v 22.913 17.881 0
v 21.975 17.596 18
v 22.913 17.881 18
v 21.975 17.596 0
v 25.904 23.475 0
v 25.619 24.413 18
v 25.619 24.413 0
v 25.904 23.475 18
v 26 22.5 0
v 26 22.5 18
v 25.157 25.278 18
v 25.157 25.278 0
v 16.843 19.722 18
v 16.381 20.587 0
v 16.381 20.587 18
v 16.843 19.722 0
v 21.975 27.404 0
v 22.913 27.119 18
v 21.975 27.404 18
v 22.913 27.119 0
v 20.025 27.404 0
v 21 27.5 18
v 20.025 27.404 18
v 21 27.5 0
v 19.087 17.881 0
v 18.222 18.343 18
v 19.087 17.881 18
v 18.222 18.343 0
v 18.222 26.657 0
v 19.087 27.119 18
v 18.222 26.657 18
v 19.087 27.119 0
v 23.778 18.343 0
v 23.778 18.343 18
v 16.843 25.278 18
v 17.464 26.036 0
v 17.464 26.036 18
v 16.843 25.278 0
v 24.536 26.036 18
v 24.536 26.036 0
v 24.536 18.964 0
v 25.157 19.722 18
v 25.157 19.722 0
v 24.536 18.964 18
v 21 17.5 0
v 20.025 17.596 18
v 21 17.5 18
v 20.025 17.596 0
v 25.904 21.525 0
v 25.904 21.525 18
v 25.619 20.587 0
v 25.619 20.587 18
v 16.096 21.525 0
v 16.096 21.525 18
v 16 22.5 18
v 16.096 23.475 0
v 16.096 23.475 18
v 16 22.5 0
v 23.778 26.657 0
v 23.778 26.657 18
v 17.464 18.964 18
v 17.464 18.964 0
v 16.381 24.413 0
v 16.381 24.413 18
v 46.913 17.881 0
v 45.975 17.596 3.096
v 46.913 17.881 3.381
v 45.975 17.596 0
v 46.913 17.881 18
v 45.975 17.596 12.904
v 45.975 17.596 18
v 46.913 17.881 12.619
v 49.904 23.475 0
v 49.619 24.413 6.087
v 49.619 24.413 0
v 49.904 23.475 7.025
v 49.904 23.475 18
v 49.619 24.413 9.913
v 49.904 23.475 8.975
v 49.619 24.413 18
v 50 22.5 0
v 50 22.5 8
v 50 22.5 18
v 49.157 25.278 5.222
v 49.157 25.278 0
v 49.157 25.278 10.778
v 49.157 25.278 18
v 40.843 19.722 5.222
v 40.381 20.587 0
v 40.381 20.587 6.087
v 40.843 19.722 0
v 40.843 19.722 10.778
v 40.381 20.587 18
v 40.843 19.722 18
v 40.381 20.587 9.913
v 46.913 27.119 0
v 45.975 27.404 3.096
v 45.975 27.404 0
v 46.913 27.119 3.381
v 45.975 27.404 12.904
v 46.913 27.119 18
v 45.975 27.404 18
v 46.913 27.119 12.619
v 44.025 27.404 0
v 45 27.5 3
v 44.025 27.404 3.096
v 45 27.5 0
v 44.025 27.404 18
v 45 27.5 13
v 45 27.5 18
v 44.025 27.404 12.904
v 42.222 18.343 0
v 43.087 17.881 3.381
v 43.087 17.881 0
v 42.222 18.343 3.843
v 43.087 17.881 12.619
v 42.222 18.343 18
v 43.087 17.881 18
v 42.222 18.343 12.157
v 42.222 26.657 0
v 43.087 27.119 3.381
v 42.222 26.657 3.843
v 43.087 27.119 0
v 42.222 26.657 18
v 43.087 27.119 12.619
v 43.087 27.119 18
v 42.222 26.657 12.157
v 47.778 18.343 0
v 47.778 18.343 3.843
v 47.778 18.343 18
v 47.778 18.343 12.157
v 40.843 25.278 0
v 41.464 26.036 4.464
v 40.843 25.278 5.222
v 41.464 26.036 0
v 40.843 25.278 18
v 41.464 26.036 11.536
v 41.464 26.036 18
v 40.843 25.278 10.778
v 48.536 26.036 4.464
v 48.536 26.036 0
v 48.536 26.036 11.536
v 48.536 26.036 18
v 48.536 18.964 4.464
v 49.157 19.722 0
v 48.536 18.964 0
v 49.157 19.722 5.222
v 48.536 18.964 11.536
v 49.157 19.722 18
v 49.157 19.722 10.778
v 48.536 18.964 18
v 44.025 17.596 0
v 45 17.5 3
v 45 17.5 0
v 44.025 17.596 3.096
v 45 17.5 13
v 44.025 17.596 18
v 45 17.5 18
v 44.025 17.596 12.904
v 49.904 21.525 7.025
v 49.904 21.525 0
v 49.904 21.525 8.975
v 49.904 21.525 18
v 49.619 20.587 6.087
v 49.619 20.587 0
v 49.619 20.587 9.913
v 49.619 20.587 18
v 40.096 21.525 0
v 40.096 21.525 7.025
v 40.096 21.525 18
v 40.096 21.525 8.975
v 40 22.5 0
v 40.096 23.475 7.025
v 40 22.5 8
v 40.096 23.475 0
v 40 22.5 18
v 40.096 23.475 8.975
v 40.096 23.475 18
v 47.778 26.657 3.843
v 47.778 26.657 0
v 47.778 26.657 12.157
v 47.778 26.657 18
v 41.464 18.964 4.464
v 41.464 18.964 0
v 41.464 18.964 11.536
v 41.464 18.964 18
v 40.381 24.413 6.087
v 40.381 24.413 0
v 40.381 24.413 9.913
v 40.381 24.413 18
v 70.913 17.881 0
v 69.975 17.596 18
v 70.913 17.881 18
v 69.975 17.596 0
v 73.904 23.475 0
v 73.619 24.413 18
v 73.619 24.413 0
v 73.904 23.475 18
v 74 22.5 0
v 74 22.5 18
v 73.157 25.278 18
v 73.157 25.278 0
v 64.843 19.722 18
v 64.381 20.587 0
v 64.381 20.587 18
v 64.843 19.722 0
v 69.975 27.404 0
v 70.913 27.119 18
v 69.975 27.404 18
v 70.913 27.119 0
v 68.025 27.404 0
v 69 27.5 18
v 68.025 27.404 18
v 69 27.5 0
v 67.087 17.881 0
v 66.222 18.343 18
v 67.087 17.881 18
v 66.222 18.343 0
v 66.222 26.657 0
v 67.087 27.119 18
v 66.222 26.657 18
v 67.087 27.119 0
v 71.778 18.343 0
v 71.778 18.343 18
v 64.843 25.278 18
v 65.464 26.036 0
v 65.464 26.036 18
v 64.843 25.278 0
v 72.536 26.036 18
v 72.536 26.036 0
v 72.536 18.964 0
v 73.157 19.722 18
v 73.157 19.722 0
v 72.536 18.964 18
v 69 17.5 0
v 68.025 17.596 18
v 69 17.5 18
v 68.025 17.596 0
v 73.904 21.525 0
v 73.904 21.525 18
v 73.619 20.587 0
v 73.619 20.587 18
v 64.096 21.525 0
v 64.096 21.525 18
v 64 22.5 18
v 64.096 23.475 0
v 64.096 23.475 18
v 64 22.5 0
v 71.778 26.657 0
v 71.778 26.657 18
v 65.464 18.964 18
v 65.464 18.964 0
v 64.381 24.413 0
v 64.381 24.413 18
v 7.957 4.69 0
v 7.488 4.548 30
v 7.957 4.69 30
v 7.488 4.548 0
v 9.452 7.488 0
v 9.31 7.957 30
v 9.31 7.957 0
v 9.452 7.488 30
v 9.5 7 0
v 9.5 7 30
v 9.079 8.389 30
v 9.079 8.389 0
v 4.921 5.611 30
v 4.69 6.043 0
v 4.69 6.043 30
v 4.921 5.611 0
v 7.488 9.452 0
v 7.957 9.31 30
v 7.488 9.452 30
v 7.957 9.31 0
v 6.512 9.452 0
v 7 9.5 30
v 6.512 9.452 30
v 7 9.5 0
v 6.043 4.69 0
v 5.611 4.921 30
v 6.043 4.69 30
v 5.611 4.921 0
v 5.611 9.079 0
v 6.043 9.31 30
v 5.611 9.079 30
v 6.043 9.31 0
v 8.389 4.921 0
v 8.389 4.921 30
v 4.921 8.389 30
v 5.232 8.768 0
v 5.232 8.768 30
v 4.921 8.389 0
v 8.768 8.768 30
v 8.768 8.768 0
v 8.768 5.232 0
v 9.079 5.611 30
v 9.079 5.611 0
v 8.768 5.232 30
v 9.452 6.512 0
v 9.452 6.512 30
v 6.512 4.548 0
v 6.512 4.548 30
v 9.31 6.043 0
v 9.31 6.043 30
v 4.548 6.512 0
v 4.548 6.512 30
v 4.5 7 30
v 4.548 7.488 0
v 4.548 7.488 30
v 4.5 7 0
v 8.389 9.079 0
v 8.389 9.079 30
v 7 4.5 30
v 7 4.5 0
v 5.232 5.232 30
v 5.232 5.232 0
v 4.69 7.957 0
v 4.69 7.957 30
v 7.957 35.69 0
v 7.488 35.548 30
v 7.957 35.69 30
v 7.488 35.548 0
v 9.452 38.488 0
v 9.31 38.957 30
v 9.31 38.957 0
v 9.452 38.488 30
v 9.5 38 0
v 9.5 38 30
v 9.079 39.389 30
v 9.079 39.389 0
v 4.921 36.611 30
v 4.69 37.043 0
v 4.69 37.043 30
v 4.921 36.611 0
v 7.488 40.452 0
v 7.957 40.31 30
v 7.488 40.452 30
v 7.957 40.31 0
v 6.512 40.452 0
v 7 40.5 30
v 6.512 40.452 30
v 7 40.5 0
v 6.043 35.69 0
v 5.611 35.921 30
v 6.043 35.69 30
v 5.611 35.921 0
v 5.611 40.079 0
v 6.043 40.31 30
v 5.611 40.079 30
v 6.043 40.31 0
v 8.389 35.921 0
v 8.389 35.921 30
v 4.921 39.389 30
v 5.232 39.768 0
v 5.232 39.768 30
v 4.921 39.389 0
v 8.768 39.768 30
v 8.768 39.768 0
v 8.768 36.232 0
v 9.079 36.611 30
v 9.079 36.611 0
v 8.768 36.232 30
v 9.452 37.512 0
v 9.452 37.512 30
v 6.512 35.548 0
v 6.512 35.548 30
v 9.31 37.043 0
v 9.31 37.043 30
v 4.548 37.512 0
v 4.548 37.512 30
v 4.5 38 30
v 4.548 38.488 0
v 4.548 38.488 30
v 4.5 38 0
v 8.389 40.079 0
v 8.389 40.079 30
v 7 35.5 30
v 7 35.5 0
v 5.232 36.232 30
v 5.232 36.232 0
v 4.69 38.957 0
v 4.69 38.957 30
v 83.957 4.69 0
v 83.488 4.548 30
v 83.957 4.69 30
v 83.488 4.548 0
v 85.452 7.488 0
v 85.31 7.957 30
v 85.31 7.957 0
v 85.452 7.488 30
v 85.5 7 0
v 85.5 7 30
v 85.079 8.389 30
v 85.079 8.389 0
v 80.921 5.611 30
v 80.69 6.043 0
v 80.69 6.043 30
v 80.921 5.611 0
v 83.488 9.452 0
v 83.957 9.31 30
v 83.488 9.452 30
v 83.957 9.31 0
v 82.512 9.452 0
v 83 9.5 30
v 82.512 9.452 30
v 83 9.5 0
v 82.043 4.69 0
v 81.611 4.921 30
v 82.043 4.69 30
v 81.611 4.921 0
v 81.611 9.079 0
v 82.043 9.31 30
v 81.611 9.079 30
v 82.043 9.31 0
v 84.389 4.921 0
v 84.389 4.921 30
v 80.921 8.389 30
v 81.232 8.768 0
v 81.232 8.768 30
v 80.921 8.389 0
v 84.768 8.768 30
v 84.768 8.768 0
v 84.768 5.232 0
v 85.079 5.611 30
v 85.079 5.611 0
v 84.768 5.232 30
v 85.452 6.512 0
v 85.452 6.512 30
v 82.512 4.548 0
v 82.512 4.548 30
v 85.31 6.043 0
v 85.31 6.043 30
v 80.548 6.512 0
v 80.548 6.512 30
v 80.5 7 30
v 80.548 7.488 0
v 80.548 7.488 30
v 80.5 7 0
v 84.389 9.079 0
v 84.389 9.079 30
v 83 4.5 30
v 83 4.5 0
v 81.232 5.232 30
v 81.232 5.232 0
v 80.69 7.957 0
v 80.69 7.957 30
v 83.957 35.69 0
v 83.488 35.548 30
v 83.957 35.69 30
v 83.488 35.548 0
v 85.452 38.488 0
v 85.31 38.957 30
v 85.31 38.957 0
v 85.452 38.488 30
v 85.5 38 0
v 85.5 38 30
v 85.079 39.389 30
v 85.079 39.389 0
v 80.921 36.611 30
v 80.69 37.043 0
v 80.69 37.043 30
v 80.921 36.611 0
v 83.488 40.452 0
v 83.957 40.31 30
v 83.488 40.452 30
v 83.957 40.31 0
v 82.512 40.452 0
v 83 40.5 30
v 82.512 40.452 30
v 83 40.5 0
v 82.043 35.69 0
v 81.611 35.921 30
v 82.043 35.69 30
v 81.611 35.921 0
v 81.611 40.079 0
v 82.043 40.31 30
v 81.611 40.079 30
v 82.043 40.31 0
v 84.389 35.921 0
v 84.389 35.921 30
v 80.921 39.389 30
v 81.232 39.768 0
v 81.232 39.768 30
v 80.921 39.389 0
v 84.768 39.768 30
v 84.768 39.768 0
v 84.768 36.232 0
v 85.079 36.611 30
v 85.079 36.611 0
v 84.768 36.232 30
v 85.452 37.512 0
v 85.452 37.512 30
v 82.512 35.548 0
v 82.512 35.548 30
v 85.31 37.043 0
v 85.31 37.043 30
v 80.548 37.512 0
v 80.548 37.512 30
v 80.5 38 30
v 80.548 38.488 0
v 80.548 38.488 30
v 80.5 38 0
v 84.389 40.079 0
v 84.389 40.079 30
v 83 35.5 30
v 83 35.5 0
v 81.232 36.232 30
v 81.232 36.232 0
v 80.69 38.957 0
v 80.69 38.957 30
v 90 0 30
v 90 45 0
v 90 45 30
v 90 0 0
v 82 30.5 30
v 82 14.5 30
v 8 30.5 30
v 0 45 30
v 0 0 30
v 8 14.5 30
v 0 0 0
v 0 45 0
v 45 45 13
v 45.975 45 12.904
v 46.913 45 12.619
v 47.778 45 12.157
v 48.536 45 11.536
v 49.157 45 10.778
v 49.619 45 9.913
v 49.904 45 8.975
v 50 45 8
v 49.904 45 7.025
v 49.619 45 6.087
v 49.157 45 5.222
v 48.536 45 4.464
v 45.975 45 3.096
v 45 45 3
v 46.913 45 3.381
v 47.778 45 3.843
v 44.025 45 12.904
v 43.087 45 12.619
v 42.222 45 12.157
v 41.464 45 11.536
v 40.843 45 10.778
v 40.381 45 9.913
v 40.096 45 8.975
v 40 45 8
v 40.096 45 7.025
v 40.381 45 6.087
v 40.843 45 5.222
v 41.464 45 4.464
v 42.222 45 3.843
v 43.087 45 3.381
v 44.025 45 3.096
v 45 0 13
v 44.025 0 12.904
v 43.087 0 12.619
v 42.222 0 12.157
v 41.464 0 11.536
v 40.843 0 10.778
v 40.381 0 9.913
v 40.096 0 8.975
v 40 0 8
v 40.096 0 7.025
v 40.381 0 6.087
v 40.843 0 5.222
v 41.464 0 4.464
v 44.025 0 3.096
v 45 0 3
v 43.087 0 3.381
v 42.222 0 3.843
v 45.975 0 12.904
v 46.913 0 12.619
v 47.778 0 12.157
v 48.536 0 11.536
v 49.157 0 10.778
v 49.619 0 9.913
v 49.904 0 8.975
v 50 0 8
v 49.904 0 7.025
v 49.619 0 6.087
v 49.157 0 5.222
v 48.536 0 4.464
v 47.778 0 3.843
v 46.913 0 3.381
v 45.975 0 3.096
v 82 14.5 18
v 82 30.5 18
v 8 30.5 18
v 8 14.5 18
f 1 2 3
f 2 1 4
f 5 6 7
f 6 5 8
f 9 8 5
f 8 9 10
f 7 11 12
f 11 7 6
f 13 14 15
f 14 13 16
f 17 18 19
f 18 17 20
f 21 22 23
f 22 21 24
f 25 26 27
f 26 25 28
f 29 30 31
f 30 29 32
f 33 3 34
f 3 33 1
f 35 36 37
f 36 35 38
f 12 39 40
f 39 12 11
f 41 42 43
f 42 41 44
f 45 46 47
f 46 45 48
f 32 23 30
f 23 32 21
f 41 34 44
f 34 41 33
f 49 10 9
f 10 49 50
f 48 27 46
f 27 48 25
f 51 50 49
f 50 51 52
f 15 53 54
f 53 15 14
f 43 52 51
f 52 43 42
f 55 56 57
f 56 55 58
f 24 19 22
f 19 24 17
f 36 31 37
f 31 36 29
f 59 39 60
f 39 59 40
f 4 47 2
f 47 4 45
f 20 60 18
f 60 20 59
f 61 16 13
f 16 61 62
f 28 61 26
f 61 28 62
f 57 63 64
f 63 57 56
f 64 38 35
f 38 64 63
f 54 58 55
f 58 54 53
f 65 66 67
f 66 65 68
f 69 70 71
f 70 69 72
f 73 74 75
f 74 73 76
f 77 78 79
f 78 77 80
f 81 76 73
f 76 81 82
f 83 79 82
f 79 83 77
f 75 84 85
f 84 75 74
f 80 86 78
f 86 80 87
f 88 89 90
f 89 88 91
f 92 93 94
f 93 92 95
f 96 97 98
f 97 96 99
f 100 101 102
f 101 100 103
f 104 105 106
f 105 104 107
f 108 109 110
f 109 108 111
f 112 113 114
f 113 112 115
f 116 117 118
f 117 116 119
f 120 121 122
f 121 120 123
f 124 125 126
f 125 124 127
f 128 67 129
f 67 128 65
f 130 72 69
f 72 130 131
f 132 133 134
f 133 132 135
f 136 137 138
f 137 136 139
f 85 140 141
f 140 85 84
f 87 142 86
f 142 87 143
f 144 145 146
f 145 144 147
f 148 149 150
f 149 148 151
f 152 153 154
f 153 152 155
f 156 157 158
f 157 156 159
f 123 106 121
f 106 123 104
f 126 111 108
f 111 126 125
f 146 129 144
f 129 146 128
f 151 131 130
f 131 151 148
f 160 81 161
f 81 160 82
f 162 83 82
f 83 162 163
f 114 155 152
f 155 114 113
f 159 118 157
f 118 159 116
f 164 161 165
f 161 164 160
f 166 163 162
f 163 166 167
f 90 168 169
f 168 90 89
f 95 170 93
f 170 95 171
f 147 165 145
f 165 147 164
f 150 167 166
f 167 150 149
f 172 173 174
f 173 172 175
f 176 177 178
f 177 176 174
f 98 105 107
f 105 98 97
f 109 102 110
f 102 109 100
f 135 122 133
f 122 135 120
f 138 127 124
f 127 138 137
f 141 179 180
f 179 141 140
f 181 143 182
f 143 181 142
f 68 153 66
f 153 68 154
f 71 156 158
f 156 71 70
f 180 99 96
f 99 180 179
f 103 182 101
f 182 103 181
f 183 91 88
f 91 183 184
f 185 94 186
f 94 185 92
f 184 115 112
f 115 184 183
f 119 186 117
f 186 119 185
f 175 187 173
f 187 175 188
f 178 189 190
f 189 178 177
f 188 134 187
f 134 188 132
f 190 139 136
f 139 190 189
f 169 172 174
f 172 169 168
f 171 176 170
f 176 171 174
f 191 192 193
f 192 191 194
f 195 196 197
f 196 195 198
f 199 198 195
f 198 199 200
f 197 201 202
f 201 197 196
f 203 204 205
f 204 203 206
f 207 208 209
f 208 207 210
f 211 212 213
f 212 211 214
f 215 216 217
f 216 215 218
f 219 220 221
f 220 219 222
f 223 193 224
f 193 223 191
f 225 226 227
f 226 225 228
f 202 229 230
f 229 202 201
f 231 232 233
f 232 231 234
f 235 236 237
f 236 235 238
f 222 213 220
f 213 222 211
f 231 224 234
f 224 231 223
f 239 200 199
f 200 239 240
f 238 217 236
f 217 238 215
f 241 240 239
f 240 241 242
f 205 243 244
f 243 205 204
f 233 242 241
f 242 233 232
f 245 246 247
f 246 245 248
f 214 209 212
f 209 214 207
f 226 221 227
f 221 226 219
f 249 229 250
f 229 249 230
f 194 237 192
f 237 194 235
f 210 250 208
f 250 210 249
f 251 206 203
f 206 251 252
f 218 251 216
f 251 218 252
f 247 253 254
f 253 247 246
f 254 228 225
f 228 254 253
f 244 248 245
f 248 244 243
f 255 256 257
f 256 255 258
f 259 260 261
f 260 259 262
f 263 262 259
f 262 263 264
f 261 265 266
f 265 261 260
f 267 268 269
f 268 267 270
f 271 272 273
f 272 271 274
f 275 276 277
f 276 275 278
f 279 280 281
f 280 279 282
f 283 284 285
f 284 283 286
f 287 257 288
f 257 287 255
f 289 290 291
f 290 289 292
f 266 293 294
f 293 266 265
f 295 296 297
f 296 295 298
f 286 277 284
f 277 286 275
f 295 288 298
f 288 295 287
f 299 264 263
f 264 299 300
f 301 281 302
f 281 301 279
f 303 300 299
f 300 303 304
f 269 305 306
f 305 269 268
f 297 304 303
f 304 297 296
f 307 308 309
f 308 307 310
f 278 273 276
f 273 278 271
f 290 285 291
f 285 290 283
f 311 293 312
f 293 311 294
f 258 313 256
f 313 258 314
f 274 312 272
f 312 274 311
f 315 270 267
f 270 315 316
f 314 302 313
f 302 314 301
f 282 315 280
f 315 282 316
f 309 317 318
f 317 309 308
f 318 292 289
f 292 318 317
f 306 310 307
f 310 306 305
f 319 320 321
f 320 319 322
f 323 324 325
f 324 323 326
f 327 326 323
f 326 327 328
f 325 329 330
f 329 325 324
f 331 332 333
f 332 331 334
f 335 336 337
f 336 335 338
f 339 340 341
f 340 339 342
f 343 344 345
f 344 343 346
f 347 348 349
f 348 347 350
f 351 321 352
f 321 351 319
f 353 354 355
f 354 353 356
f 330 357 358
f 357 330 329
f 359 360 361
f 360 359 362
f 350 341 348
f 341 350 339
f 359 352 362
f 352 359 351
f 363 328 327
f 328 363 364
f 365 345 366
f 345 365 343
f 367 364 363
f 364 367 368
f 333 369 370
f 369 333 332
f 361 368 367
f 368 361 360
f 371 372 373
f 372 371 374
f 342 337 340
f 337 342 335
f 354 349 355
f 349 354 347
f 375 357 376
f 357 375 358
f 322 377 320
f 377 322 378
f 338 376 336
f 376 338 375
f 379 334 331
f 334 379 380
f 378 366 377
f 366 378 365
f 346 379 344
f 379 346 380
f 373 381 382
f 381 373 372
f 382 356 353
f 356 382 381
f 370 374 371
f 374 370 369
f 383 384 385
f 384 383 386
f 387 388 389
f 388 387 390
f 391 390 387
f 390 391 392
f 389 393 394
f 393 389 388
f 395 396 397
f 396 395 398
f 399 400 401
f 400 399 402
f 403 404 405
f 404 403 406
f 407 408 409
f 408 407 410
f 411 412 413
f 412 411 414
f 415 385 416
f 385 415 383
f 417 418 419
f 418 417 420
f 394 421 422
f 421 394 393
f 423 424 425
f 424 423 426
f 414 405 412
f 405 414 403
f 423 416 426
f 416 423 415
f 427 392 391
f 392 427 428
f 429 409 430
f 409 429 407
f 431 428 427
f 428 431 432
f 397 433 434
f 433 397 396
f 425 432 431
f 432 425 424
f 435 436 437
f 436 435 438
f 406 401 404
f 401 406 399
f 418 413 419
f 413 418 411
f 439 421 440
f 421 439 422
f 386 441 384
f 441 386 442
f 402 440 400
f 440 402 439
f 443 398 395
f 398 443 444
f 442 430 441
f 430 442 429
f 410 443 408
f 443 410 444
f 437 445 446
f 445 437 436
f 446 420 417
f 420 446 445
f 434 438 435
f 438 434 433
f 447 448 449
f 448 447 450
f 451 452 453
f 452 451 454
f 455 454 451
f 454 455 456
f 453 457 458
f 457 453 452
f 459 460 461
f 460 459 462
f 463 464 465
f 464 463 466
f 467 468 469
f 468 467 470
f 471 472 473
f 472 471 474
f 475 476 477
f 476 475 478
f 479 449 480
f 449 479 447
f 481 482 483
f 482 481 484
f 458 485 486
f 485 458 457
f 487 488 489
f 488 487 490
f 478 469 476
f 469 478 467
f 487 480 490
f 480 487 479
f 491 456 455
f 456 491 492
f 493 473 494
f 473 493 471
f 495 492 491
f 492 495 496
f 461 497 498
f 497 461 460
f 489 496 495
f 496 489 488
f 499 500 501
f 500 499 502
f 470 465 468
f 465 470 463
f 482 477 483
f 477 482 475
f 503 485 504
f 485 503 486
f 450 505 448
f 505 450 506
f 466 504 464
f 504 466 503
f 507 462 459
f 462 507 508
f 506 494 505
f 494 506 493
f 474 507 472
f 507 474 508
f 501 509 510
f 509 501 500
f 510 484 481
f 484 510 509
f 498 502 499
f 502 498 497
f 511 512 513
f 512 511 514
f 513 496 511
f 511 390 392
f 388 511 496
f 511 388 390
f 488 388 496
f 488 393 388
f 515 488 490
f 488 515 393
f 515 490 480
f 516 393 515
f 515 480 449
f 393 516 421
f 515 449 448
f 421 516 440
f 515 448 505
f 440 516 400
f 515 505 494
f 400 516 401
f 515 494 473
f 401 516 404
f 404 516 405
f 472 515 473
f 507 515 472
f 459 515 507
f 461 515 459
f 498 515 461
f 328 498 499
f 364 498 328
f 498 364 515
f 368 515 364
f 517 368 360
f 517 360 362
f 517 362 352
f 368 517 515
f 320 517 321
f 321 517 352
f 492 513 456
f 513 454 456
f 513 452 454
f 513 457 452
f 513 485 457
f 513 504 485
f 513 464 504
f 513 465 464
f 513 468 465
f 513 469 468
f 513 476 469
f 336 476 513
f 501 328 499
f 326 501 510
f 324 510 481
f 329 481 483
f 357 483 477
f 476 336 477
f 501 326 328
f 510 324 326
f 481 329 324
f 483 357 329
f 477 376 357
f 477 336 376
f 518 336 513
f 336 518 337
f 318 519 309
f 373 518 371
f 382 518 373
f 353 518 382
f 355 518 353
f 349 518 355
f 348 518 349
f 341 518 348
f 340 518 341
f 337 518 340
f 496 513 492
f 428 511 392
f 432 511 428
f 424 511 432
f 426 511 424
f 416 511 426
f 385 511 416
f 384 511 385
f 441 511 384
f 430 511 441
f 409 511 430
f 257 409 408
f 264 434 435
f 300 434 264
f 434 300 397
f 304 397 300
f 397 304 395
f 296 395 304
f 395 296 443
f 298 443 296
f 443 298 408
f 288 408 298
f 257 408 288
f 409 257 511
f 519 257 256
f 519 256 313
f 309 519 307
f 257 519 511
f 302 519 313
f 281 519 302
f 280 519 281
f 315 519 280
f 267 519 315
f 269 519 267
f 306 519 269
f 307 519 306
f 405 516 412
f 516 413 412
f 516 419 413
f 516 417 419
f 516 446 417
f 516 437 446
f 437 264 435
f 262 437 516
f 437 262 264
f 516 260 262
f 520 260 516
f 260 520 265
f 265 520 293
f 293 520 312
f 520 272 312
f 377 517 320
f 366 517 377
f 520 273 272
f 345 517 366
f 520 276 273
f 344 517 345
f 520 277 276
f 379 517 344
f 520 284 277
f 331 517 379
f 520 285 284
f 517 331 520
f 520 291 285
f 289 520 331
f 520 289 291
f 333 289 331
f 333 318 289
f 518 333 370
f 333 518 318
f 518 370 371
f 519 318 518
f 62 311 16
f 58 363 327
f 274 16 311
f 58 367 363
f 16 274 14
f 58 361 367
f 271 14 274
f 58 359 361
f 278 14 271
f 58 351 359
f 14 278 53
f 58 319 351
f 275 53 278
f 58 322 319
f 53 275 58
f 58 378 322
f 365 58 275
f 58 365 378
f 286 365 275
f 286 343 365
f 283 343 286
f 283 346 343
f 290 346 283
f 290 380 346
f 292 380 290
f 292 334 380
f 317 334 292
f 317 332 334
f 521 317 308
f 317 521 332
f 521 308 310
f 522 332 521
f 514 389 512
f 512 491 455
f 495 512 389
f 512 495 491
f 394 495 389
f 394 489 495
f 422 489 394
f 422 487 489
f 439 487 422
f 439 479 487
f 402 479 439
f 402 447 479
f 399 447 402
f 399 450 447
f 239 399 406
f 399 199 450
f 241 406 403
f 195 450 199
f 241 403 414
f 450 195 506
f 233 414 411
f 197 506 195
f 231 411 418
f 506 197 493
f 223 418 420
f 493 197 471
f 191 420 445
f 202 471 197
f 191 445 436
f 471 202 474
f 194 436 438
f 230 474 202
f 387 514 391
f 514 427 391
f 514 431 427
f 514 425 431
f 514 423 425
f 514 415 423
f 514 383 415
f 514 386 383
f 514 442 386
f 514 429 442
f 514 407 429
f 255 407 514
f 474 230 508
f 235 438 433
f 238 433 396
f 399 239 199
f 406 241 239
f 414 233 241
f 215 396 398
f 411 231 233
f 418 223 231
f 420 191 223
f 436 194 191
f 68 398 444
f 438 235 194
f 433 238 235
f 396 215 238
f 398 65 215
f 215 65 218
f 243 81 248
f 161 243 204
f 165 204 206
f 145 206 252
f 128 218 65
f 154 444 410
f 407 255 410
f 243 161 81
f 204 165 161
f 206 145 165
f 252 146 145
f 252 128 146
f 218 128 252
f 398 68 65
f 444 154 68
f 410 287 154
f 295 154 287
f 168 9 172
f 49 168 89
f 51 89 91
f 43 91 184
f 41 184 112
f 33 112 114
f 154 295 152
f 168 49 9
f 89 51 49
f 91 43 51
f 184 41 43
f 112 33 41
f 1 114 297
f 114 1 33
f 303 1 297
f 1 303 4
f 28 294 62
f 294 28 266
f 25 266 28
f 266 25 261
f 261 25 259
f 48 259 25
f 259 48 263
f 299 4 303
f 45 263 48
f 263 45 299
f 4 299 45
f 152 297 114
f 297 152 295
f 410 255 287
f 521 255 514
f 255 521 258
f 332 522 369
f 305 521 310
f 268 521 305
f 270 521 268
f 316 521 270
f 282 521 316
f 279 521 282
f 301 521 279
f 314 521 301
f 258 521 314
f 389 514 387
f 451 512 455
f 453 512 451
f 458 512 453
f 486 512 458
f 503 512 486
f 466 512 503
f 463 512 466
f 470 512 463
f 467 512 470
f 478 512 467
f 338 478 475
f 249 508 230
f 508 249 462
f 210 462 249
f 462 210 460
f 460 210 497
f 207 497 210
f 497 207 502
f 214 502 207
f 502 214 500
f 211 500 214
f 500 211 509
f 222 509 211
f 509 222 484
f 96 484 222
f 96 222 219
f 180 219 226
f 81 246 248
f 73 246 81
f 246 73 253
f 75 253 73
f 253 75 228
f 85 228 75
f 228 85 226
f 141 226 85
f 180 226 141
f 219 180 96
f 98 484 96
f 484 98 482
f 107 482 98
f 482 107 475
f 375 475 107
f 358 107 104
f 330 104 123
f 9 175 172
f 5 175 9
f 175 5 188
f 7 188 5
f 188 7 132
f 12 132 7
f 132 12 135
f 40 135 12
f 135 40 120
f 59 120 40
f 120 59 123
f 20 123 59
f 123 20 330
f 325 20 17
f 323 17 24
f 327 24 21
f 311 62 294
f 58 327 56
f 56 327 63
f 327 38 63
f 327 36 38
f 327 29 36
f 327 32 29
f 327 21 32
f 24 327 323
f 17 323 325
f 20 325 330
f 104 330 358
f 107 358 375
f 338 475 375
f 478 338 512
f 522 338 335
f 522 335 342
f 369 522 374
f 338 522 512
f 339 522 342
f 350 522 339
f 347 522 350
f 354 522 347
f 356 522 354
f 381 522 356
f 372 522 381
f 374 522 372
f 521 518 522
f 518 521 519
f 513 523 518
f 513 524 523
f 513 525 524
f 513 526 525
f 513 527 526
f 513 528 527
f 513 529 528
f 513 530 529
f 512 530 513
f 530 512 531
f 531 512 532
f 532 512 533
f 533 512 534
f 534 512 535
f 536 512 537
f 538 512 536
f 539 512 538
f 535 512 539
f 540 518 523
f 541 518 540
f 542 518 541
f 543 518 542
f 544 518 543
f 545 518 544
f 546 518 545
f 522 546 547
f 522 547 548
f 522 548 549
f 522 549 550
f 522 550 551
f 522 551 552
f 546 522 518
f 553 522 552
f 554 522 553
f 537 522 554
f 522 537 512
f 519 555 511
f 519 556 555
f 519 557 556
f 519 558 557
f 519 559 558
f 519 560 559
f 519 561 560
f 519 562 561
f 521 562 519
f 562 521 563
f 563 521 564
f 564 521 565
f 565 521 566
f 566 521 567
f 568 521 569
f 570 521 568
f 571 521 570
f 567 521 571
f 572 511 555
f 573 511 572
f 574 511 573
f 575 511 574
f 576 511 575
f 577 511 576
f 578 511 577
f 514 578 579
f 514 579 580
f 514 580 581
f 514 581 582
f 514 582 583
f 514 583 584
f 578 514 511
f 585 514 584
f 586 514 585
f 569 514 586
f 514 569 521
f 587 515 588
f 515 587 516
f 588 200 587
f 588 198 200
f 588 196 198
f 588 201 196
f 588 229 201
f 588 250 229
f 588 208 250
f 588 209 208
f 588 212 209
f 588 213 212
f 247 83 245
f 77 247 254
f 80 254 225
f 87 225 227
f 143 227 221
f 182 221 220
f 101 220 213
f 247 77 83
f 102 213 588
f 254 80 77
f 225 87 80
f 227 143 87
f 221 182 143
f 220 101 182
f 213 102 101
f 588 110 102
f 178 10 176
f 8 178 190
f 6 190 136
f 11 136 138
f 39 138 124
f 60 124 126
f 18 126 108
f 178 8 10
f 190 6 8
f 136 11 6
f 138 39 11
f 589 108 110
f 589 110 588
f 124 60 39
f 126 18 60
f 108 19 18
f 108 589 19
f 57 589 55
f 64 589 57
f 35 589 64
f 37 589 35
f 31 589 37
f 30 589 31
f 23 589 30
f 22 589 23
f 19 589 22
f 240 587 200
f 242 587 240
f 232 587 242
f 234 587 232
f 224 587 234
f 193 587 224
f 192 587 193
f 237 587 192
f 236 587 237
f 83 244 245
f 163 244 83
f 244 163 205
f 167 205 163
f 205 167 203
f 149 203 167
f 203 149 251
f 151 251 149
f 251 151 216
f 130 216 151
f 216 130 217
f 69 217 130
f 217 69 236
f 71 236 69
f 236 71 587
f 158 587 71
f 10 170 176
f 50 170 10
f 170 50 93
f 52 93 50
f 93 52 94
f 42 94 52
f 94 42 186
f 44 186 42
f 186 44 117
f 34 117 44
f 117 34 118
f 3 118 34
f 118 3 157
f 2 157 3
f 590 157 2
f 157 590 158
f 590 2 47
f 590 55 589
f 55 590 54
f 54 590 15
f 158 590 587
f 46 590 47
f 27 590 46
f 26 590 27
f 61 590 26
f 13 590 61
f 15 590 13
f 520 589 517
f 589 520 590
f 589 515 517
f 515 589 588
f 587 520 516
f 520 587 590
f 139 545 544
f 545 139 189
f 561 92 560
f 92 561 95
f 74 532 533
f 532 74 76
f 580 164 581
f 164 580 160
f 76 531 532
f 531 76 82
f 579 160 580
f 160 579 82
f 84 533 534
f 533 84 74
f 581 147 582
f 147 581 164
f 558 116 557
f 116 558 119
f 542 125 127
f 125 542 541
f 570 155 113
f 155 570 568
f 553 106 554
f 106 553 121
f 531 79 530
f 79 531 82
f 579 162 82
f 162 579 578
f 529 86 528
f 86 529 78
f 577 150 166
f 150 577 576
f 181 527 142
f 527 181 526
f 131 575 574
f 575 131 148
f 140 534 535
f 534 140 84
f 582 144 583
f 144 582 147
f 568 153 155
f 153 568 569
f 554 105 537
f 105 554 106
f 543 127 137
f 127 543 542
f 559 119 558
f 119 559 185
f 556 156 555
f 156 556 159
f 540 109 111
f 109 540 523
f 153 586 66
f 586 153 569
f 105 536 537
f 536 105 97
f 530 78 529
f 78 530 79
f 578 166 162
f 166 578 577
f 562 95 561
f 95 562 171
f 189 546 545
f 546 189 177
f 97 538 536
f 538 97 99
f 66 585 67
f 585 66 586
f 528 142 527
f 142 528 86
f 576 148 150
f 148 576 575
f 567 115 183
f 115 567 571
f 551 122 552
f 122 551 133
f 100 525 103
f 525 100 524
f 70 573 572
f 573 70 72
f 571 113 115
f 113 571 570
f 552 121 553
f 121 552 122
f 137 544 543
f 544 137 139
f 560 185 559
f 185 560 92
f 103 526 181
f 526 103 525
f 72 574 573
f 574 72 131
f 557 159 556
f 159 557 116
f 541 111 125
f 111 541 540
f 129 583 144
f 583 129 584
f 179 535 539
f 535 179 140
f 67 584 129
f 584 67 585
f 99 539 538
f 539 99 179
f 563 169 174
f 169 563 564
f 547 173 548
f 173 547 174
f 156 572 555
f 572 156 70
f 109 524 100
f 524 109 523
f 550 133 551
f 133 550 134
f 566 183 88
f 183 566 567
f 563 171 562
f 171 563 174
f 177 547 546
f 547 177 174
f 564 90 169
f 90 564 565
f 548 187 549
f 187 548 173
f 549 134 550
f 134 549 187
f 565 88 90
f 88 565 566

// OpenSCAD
$fn = 32;

// ----------------------------------------------------------------------
// Manifold block: side_outlet manifold
// ----------------------------------------------------------------------

// --- parameters (mm) ---
block_l = 90;             // block length, X
block_w = 45;             // block width, Y
block_h = 30;             // block height, Z
port_d = 10;              // port bore diameter
port_pitch = 24;          // port pitch along X
gallery_d = 16;           // top gallery width, Y
gallery_depth = 12;       // gallery pocket depth
wall_p = 8;               // gallery end wall thickness, X
mnt_d = 5;                // mounting hole diameter
mnt_in = 7;               // mounting hole inset from the edges
out_d = 10;               // outlet bore diameter
out_z = 8;                // outlet axis height

n_ports = 3;  // ports in the row
port_x0 = (block_l - (n_ports - 1) * port_pitch) / 2;  // first port X

difference() {
  cube([block_l, block_w, block_h]);
  for (i = [0 : n_ports - 1])
    translate([port_x0 + i * port_pitch, block_w / 2, -1])
      cylinder(h = block_h + 2, d = port_d);
  translate([wall_p, block_w / 2 - gallery_d / 2, block_h - gallery_depth])
    cube([block_l - 2 * wall_p, gallery_d, gallery_depth + 1]);
  for (cx = [mnt_in, block_l - mnt_in])
    for (cy = [mnt_in, block_w - mnt_in])
      translate([cx, cy, -1]) cylinder(h = block_h + 2, d = mnt_d);
  translate([block_l / 2, -1, out_z]) rotate([-90, 0, 0])
    cylinder(h = block_w + 2, d = out_d);
}
